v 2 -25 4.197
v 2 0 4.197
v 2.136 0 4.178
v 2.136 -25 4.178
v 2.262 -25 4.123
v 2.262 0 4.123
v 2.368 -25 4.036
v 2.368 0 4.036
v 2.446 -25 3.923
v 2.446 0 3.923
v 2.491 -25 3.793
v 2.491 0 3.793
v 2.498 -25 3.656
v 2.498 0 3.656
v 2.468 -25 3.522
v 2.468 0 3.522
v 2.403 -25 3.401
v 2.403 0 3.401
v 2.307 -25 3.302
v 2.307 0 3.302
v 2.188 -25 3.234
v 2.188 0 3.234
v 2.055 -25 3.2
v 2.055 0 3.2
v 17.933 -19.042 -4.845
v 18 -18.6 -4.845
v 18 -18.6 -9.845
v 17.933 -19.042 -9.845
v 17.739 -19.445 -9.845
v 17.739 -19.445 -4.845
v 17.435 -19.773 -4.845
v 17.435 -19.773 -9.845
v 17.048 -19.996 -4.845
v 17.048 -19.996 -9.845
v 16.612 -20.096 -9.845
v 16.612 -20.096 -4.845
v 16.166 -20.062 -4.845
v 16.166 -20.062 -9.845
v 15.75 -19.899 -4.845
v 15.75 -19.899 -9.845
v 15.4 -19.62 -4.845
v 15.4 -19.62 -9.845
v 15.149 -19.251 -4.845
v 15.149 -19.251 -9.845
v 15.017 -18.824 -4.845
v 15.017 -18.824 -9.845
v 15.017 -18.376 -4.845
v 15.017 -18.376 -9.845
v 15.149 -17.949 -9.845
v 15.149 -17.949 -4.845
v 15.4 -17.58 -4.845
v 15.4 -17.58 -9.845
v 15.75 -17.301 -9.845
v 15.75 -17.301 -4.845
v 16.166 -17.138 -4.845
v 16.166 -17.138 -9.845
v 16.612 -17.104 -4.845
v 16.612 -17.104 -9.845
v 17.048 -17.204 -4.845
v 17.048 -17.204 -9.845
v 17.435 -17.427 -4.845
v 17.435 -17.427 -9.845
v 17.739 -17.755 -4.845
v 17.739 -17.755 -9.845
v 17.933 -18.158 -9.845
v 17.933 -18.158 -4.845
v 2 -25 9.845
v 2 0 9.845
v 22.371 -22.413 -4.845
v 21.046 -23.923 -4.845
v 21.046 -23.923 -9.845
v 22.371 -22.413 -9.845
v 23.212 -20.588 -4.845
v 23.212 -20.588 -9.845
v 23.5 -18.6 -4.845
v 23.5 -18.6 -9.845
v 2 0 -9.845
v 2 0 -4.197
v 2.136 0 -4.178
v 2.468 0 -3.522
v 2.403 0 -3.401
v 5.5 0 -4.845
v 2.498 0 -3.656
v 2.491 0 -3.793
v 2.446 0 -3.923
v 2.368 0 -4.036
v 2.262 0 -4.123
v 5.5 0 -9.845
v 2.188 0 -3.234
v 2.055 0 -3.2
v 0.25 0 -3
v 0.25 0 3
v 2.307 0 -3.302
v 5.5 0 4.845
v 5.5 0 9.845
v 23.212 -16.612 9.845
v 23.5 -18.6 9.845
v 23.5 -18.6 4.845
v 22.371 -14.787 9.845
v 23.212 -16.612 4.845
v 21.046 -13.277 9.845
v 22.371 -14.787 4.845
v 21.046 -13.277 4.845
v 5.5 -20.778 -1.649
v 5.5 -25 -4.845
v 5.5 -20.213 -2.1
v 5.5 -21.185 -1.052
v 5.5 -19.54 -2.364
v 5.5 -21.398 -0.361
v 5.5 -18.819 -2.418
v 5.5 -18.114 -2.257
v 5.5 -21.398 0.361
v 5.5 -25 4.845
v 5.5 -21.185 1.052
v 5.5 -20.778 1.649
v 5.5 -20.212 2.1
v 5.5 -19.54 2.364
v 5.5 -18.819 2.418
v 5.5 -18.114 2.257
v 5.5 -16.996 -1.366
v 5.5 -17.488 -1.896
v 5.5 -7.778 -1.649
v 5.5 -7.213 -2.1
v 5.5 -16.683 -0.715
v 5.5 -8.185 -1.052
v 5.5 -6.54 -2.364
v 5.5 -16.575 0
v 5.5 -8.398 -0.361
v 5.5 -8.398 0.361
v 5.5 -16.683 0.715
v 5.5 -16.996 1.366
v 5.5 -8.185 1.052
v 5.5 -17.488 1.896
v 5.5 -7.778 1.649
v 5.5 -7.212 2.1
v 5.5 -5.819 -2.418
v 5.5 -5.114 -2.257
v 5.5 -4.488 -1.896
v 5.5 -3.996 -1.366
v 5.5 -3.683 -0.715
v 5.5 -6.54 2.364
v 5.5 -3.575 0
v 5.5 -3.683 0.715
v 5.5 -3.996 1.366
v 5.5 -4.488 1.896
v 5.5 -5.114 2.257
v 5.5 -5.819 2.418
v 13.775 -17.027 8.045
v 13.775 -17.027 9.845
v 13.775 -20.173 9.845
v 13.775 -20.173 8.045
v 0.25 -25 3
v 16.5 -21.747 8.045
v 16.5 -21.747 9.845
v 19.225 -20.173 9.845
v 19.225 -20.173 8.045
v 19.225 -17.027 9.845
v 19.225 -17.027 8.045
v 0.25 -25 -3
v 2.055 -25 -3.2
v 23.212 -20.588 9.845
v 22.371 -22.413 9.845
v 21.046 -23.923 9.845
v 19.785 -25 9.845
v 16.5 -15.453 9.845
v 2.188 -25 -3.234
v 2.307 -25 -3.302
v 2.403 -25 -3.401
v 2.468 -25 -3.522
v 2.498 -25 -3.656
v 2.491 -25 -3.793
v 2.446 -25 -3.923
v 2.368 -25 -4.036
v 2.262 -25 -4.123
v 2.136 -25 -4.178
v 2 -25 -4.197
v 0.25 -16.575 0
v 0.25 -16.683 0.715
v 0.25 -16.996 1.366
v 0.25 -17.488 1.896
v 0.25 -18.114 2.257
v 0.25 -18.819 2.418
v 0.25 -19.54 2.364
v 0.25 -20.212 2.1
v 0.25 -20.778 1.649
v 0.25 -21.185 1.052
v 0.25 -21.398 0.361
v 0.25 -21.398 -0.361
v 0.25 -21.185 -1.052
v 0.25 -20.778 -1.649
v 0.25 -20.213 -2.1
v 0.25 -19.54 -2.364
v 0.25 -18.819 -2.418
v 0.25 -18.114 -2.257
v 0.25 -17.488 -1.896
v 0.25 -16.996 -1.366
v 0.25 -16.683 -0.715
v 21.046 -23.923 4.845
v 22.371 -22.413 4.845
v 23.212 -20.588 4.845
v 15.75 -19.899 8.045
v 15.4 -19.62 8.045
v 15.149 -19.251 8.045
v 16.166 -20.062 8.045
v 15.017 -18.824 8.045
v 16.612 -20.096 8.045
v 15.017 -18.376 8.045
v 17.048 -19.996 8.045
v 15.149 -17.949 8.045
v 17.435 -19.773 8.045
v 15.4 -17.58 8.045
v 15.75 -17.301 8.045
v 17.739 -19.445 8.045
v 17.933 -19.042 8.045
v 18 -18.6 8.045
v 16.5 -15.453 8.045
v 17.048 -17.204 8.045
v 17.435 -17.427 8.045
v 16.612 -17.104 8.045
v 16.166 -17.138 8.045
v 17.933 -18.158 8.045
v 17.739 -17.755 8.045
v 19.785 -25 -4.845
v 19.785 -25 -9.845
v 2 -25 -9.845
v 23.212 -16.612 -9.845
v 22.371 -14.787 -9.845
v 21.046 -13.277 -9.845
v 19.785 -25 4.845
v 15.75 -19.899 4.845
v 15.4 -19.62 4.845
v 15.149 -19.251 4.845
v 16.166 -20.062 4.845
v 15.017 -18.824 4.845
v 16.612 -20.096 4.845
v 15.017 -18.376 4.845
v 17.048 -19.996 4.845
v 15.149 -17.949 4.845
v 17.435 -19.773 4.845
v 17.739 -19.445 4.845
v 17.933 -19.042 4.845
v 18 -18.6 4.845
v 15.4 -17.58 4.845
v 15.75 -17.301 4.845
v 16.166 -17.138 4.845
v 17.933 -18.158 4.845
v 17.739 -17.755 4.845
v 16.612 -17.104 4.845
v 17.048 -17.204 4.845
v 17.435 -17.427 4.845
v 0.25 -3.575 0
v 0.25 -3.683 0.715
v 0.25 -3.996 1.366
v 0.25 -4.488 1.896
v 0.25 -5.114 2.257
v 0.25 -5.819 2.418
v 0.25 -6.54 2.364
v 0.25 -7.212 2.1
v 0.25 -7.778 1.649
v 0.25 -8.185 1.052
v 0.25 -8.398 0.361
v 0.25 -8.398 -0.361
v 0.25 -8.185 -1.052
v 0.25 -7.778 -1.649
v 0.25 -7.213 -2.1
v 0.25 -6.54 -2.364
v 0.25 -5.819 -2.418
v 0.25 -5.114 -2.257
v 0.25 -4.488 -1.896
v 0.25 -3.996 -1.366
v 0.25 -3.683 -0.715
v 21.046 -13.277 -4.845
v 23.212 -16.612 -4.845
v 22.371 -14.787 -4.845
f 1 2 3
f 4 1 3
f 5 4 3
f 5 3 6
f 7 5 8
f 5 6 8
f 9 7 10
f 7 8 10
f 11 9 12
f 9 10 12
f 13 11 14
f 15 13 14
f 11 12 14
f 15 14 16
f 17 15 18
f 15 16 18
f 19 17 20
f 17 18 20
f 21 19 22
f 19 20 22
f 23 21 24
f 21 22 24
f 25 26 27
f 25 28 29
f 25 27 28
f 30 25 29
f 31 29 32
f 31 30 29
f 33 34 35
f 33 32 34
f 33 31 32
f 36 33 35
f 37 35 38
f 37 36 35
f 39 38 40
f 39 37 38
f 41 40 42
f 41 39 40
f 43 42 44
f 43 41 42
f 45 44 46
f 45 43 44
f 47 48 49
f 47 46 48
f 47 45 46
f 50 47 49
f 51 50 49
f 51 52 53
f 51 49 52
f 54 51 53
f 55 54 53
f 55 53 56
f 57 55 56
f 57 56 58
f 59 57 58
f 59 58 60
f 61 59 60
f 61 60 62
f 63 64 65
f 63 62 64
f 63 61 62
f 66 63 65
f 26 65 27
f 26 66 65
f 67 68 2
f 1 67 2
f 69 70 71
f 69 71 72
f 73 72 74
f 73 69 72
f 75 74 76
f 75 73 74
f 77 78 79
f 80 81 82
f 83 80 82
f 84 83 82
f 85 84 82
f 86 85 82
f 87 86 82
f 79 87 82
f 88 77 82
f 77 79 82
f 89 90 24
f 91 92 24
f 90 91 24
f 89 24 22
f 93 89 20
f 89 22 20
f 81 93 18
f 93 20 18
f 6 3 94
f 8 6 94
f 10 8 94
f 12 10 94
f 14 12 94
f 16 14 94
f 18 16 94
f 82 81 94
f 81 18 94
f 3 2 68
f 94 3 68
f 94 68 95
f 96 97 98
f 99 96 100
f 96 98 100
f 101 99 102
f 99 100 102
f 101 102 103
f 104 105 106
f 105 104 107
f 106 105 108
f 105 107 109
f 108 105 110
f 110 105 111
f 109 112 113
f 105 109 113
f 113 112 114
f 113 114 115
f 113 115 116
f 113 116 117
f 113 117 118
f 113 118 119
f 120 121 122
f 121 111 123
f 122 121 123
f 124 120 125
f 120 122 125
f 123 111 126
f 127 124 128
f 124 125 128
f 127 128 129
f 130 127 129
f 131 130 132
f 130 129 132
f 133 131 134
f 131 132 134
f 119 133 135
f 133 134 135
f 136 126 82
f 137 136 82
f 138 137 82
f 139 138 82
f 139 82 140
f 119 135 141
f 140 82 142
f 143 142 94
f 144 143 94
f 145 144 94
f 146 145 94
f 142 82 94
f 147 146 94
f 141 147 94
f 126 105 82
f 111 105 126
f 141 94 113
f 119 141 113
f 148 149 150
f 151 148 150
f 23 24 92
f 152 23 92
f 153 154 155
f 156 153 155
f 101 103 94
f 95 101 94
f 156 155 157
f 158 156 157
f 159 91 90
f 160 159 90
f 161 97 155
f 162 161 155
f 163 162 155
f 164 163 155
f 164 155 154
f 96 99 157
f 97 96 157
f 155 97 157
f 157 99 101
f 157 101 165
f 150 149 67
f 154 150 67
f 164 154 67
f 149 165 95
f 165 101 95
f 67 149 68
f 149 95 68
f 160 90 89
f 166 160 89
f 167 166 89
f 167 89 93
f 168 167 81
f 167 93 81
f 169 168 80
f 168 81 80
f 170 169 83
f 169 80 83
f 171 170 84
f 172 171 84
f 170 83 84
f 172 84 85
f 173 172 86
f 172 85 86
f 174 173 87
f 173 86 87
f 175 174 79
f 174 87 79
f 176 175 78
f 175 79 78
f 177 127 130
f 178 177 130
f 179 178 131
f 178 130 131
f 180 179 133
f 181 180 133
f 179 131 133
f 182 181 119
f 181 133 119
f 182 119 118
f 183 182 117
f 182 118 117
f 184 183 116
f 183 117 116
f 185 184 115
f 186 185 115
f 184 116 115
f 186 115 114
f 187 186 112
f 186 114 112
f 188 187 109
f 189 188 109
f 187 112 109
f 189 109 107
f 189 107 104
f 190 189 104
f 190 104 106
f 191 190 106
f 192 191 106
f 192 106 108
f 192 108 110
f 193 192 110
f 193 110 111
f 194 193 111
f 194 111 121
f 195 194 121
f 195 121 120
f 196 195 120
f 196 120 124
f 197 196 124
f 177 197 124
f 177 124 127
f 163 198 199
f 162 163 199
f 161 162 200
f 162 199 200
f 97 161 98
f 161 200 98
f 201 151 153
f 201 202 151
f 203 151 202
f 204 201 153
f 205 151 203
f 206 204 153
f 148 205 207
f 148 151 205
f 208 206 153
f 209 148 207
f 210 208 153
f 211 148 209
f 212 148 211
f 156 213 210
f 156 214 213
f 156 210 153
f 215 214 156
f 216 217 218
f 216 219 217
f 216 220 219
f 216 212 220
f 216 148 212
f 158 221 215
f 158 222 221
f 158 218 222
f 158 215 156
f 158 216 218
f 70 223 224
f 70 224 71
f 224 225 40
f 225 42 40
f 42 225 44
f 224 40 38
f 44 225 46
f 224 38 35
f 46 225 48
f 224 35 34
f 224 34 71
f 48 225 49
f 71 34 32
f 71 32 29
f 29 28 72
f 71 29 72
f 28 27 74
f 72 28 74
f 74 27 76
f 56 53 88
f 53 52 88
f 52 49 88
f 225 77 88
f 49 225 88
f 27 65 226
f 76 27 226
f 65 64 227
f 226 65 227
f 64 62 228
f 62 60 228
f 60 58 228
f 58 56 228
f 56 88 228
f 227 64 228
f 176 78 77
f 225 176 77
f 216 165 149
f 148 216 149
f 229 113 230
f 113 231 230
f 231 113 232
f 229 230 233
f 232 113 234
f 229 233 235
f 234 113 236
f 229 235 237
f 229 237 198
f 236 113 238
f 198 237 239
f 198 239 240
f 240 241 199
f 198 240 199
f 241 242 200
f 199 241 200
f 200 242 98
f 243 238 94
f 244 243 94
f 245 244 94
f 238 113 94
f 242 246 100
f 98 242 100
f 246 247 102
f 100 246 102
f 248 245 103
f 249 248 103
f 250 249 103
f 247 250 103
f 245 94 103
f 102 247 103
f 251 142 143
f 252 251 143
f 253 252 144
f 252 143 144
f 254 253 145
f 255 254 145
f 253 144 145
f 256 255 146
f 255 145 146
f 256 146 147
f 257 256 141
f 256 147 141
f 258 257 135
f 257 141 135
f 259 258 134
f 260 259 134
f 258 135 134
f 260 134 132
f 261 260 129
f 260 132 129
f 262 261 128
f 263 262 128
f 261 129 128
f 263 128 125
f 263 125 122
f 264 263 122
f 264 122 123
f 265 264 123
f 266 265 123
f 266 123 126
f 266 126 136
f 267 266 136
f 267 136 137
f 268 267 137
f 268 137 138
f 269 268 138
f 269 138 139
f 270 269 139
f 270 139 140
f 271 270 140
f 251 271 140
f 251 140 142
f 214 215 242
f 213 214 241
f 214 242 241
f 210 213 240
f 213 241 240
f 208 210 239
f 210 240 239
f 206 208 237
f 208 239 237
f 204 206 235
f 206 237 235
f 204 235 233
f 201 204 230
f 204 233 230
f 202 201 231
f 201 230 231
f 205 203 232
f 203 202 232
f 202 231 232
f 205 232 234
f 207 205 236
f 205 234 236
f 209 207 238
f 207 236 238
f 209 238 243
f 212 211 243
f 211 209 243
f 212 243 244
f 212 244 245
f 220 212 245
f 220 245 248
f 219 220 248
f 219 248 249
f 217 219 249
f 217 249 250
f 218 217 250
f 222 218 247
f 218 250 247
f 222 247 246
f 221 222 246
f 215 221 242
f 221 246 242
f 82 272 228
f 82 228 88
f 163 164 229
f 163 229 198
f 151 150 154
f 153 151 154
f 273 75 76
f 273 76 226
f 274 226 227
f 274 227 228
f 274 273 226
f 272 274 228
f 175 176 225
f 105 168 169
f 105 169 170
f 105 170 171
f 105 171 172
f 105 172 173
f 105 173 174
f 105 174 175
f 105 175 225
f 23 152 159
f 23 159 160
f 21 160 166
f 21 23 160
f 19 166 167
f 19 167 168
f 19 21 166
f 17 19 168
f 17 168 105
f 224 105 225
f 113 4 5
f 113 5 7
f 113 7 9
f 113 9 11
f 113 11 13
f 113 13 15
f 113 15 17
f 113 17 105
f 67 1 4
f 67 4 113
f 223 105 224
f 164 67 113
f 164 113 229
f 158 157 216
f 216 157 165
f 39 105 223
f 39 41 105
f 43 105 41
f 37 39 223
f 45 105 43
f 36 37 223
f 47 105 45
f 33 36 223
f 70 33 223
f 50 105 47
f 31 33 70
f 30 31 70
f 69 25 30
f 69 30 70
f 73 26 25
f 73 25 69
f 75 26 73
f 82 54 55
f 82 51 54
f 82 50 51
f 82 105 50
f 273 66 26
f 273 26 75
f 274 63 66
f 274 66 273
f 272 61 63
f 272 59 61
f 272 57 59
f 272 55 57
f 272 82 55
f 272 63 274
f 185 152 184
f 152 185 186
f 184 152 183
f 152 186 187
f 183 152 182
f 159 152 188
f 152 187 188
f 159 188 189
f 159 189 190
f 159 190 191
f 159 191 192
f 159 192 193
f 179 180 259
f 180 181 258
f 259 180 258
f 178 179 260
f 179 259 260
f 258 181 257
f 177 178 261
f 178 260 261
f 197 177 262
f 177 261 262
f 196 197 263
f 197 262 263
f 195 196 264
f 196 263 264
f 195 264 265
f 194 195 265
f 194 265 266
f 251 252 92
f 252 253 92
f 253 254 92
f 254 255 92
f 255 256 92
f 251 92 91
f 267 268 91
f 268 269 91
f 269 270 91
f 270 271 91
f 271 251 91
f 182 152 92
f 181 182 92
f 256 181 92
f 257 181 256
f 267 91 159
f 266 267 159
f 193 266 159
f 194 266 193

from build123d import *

# Parameters (mm, degrees)
F0_W          = 18
F0_H          = 5
F1_DEPTH      = 25
F2_R          = 1.5
F3_DEPTH      = 14.691
F3_DEPTH_BACK = 25
F0_W_2        = 8
F0_H_2        = 0.52
F5_DEPTH      = 25
F6_R          = 2.425
F7_DEPTH      = 25
F8_R          = 1.5
F9_DEPTH      = 1.8


with BuildPart() as f1:
    # F0 (on Front) → F1 (new body)
    with BuildSketch(Plane.XZ):
        with BuildLine():
            Line((2, -9.845), (5.5, -9.845))
            Line((5.5, -9.845), (5.5, -4.845))
            Line((5.5, -4.845), (5.5, 4.845))
            Line((5.5, 4.845), (5.5, 9.845))
            Line((5.5, 9.845), (2, 9.845))
            Line((2, 9.845), (2, 4.196959))
            ThreePointArc((2, 4.196959), (2.499239, 3.724532), (2.055063, 3.2))
            Line((2.055063, 3.2), (0.25, 3))
            Line((0.25, 3), (0.25, -3))
            Line((0.25, -3), (2.055063, -3.2))
            ThreePointArc((2.055063, -3.2), (2.499239, -3.724532), (2, -4.196959))
            Line((2, -4.196959), (2, -9.845))
        make_face()
        with Locations((14.5, -7.345)):
            Rectangle(F0_W, F0_H)
        with Locations((14.5, 7.345)):
            Rectangle(F0_W, F0_H)
    extrude(amount=F1_DEPTH)

    # F2 (on face) → F3 (cut, two sides)
    with BuildSketch(Plane(origin=(0, 0, 4.845), x_dir=(1, 0, 0), z_dir=(0, 0, -1))) as f3_sk:
        with BuildLine():
            Line((23.5, 25), (19.784899, 25))
            Line((19.784899, 25), (21.046038, 23.922926))
            ThreePointArc((21.046038, 23.922926), (22.856975, 21.530677), (23.5, 18.6))
            Line((23.5, 18.6), (23.5, 25))
        make_face()
        with BuildLine():
            Line((23.5, 0), (23.5, 18.6))
            ThreePointArc((23.5, 18.6), (22.856975, 15.669323), (21.046038, 13.277074))
            Line((21.046038, 13.277074), (5.5, 0))
            Line((5.5, 0), (23.5, 0))
        make_face()
        with Locations((16.5, 18.6)):
            Circle(F2_R)
    extrude(amount=F3_DEPTH, mode=Mode.SUBTRACT)
    extrude(f3_sk.sketch, amount=-F3_DEPTH_BACK, mode=Mode.SUBTRACT)

    # F0 (on Front) → F5 (cut)
    with BuildSketch(Plane.XZ):
        Polygon((10.765, 4.225), (10.765, -4.225), (12.5, -4.225), (20.5, -4.225), (22.235, -4.225), (22.235, 4.225), (20.5, 4.225), (12.5, 4.225), align=None)
        with Locations((16.5, 4.485)):
            Rectangle(F0_W_2, F0_H_2)
        with Locations((16.5, -4.485)):
            Rectangle(F0_W_2, F0_H_2)
    extrude(amount=F5_DEPTH, mode=Mode.SUBTRACT)

    # F6 (on face) → F7 (cut)
    with BuildSketch(Plane.YZ.offset(5.5)):
        with Locations((-6, 0)):
            Circle(F6_R)
        with Locations((-19, 0)):
            Circle(F6_R)
    extrude(amount=-F7_DEPTH, mode=Mode.SUBTRACT)

    # F8 (on face) → F9 (cut)
    with BuildSketch(Plane.XY.offset(9.845)):
        Polygon((19.225, -20.173279), (19.225, -17.026721), (16.5, -15.453441), (13.775, -17.026721), (13.775, -20.173279), (16.5, -21.746559), align=None)
        with Locations((16.5, -18.6)):
            Circle(F8_R, mode=Mode.SUBTRACT)
    extrude(amount=-F9_DEPTH, mode=Mode.SUBTRACT)


solid = f1.part
